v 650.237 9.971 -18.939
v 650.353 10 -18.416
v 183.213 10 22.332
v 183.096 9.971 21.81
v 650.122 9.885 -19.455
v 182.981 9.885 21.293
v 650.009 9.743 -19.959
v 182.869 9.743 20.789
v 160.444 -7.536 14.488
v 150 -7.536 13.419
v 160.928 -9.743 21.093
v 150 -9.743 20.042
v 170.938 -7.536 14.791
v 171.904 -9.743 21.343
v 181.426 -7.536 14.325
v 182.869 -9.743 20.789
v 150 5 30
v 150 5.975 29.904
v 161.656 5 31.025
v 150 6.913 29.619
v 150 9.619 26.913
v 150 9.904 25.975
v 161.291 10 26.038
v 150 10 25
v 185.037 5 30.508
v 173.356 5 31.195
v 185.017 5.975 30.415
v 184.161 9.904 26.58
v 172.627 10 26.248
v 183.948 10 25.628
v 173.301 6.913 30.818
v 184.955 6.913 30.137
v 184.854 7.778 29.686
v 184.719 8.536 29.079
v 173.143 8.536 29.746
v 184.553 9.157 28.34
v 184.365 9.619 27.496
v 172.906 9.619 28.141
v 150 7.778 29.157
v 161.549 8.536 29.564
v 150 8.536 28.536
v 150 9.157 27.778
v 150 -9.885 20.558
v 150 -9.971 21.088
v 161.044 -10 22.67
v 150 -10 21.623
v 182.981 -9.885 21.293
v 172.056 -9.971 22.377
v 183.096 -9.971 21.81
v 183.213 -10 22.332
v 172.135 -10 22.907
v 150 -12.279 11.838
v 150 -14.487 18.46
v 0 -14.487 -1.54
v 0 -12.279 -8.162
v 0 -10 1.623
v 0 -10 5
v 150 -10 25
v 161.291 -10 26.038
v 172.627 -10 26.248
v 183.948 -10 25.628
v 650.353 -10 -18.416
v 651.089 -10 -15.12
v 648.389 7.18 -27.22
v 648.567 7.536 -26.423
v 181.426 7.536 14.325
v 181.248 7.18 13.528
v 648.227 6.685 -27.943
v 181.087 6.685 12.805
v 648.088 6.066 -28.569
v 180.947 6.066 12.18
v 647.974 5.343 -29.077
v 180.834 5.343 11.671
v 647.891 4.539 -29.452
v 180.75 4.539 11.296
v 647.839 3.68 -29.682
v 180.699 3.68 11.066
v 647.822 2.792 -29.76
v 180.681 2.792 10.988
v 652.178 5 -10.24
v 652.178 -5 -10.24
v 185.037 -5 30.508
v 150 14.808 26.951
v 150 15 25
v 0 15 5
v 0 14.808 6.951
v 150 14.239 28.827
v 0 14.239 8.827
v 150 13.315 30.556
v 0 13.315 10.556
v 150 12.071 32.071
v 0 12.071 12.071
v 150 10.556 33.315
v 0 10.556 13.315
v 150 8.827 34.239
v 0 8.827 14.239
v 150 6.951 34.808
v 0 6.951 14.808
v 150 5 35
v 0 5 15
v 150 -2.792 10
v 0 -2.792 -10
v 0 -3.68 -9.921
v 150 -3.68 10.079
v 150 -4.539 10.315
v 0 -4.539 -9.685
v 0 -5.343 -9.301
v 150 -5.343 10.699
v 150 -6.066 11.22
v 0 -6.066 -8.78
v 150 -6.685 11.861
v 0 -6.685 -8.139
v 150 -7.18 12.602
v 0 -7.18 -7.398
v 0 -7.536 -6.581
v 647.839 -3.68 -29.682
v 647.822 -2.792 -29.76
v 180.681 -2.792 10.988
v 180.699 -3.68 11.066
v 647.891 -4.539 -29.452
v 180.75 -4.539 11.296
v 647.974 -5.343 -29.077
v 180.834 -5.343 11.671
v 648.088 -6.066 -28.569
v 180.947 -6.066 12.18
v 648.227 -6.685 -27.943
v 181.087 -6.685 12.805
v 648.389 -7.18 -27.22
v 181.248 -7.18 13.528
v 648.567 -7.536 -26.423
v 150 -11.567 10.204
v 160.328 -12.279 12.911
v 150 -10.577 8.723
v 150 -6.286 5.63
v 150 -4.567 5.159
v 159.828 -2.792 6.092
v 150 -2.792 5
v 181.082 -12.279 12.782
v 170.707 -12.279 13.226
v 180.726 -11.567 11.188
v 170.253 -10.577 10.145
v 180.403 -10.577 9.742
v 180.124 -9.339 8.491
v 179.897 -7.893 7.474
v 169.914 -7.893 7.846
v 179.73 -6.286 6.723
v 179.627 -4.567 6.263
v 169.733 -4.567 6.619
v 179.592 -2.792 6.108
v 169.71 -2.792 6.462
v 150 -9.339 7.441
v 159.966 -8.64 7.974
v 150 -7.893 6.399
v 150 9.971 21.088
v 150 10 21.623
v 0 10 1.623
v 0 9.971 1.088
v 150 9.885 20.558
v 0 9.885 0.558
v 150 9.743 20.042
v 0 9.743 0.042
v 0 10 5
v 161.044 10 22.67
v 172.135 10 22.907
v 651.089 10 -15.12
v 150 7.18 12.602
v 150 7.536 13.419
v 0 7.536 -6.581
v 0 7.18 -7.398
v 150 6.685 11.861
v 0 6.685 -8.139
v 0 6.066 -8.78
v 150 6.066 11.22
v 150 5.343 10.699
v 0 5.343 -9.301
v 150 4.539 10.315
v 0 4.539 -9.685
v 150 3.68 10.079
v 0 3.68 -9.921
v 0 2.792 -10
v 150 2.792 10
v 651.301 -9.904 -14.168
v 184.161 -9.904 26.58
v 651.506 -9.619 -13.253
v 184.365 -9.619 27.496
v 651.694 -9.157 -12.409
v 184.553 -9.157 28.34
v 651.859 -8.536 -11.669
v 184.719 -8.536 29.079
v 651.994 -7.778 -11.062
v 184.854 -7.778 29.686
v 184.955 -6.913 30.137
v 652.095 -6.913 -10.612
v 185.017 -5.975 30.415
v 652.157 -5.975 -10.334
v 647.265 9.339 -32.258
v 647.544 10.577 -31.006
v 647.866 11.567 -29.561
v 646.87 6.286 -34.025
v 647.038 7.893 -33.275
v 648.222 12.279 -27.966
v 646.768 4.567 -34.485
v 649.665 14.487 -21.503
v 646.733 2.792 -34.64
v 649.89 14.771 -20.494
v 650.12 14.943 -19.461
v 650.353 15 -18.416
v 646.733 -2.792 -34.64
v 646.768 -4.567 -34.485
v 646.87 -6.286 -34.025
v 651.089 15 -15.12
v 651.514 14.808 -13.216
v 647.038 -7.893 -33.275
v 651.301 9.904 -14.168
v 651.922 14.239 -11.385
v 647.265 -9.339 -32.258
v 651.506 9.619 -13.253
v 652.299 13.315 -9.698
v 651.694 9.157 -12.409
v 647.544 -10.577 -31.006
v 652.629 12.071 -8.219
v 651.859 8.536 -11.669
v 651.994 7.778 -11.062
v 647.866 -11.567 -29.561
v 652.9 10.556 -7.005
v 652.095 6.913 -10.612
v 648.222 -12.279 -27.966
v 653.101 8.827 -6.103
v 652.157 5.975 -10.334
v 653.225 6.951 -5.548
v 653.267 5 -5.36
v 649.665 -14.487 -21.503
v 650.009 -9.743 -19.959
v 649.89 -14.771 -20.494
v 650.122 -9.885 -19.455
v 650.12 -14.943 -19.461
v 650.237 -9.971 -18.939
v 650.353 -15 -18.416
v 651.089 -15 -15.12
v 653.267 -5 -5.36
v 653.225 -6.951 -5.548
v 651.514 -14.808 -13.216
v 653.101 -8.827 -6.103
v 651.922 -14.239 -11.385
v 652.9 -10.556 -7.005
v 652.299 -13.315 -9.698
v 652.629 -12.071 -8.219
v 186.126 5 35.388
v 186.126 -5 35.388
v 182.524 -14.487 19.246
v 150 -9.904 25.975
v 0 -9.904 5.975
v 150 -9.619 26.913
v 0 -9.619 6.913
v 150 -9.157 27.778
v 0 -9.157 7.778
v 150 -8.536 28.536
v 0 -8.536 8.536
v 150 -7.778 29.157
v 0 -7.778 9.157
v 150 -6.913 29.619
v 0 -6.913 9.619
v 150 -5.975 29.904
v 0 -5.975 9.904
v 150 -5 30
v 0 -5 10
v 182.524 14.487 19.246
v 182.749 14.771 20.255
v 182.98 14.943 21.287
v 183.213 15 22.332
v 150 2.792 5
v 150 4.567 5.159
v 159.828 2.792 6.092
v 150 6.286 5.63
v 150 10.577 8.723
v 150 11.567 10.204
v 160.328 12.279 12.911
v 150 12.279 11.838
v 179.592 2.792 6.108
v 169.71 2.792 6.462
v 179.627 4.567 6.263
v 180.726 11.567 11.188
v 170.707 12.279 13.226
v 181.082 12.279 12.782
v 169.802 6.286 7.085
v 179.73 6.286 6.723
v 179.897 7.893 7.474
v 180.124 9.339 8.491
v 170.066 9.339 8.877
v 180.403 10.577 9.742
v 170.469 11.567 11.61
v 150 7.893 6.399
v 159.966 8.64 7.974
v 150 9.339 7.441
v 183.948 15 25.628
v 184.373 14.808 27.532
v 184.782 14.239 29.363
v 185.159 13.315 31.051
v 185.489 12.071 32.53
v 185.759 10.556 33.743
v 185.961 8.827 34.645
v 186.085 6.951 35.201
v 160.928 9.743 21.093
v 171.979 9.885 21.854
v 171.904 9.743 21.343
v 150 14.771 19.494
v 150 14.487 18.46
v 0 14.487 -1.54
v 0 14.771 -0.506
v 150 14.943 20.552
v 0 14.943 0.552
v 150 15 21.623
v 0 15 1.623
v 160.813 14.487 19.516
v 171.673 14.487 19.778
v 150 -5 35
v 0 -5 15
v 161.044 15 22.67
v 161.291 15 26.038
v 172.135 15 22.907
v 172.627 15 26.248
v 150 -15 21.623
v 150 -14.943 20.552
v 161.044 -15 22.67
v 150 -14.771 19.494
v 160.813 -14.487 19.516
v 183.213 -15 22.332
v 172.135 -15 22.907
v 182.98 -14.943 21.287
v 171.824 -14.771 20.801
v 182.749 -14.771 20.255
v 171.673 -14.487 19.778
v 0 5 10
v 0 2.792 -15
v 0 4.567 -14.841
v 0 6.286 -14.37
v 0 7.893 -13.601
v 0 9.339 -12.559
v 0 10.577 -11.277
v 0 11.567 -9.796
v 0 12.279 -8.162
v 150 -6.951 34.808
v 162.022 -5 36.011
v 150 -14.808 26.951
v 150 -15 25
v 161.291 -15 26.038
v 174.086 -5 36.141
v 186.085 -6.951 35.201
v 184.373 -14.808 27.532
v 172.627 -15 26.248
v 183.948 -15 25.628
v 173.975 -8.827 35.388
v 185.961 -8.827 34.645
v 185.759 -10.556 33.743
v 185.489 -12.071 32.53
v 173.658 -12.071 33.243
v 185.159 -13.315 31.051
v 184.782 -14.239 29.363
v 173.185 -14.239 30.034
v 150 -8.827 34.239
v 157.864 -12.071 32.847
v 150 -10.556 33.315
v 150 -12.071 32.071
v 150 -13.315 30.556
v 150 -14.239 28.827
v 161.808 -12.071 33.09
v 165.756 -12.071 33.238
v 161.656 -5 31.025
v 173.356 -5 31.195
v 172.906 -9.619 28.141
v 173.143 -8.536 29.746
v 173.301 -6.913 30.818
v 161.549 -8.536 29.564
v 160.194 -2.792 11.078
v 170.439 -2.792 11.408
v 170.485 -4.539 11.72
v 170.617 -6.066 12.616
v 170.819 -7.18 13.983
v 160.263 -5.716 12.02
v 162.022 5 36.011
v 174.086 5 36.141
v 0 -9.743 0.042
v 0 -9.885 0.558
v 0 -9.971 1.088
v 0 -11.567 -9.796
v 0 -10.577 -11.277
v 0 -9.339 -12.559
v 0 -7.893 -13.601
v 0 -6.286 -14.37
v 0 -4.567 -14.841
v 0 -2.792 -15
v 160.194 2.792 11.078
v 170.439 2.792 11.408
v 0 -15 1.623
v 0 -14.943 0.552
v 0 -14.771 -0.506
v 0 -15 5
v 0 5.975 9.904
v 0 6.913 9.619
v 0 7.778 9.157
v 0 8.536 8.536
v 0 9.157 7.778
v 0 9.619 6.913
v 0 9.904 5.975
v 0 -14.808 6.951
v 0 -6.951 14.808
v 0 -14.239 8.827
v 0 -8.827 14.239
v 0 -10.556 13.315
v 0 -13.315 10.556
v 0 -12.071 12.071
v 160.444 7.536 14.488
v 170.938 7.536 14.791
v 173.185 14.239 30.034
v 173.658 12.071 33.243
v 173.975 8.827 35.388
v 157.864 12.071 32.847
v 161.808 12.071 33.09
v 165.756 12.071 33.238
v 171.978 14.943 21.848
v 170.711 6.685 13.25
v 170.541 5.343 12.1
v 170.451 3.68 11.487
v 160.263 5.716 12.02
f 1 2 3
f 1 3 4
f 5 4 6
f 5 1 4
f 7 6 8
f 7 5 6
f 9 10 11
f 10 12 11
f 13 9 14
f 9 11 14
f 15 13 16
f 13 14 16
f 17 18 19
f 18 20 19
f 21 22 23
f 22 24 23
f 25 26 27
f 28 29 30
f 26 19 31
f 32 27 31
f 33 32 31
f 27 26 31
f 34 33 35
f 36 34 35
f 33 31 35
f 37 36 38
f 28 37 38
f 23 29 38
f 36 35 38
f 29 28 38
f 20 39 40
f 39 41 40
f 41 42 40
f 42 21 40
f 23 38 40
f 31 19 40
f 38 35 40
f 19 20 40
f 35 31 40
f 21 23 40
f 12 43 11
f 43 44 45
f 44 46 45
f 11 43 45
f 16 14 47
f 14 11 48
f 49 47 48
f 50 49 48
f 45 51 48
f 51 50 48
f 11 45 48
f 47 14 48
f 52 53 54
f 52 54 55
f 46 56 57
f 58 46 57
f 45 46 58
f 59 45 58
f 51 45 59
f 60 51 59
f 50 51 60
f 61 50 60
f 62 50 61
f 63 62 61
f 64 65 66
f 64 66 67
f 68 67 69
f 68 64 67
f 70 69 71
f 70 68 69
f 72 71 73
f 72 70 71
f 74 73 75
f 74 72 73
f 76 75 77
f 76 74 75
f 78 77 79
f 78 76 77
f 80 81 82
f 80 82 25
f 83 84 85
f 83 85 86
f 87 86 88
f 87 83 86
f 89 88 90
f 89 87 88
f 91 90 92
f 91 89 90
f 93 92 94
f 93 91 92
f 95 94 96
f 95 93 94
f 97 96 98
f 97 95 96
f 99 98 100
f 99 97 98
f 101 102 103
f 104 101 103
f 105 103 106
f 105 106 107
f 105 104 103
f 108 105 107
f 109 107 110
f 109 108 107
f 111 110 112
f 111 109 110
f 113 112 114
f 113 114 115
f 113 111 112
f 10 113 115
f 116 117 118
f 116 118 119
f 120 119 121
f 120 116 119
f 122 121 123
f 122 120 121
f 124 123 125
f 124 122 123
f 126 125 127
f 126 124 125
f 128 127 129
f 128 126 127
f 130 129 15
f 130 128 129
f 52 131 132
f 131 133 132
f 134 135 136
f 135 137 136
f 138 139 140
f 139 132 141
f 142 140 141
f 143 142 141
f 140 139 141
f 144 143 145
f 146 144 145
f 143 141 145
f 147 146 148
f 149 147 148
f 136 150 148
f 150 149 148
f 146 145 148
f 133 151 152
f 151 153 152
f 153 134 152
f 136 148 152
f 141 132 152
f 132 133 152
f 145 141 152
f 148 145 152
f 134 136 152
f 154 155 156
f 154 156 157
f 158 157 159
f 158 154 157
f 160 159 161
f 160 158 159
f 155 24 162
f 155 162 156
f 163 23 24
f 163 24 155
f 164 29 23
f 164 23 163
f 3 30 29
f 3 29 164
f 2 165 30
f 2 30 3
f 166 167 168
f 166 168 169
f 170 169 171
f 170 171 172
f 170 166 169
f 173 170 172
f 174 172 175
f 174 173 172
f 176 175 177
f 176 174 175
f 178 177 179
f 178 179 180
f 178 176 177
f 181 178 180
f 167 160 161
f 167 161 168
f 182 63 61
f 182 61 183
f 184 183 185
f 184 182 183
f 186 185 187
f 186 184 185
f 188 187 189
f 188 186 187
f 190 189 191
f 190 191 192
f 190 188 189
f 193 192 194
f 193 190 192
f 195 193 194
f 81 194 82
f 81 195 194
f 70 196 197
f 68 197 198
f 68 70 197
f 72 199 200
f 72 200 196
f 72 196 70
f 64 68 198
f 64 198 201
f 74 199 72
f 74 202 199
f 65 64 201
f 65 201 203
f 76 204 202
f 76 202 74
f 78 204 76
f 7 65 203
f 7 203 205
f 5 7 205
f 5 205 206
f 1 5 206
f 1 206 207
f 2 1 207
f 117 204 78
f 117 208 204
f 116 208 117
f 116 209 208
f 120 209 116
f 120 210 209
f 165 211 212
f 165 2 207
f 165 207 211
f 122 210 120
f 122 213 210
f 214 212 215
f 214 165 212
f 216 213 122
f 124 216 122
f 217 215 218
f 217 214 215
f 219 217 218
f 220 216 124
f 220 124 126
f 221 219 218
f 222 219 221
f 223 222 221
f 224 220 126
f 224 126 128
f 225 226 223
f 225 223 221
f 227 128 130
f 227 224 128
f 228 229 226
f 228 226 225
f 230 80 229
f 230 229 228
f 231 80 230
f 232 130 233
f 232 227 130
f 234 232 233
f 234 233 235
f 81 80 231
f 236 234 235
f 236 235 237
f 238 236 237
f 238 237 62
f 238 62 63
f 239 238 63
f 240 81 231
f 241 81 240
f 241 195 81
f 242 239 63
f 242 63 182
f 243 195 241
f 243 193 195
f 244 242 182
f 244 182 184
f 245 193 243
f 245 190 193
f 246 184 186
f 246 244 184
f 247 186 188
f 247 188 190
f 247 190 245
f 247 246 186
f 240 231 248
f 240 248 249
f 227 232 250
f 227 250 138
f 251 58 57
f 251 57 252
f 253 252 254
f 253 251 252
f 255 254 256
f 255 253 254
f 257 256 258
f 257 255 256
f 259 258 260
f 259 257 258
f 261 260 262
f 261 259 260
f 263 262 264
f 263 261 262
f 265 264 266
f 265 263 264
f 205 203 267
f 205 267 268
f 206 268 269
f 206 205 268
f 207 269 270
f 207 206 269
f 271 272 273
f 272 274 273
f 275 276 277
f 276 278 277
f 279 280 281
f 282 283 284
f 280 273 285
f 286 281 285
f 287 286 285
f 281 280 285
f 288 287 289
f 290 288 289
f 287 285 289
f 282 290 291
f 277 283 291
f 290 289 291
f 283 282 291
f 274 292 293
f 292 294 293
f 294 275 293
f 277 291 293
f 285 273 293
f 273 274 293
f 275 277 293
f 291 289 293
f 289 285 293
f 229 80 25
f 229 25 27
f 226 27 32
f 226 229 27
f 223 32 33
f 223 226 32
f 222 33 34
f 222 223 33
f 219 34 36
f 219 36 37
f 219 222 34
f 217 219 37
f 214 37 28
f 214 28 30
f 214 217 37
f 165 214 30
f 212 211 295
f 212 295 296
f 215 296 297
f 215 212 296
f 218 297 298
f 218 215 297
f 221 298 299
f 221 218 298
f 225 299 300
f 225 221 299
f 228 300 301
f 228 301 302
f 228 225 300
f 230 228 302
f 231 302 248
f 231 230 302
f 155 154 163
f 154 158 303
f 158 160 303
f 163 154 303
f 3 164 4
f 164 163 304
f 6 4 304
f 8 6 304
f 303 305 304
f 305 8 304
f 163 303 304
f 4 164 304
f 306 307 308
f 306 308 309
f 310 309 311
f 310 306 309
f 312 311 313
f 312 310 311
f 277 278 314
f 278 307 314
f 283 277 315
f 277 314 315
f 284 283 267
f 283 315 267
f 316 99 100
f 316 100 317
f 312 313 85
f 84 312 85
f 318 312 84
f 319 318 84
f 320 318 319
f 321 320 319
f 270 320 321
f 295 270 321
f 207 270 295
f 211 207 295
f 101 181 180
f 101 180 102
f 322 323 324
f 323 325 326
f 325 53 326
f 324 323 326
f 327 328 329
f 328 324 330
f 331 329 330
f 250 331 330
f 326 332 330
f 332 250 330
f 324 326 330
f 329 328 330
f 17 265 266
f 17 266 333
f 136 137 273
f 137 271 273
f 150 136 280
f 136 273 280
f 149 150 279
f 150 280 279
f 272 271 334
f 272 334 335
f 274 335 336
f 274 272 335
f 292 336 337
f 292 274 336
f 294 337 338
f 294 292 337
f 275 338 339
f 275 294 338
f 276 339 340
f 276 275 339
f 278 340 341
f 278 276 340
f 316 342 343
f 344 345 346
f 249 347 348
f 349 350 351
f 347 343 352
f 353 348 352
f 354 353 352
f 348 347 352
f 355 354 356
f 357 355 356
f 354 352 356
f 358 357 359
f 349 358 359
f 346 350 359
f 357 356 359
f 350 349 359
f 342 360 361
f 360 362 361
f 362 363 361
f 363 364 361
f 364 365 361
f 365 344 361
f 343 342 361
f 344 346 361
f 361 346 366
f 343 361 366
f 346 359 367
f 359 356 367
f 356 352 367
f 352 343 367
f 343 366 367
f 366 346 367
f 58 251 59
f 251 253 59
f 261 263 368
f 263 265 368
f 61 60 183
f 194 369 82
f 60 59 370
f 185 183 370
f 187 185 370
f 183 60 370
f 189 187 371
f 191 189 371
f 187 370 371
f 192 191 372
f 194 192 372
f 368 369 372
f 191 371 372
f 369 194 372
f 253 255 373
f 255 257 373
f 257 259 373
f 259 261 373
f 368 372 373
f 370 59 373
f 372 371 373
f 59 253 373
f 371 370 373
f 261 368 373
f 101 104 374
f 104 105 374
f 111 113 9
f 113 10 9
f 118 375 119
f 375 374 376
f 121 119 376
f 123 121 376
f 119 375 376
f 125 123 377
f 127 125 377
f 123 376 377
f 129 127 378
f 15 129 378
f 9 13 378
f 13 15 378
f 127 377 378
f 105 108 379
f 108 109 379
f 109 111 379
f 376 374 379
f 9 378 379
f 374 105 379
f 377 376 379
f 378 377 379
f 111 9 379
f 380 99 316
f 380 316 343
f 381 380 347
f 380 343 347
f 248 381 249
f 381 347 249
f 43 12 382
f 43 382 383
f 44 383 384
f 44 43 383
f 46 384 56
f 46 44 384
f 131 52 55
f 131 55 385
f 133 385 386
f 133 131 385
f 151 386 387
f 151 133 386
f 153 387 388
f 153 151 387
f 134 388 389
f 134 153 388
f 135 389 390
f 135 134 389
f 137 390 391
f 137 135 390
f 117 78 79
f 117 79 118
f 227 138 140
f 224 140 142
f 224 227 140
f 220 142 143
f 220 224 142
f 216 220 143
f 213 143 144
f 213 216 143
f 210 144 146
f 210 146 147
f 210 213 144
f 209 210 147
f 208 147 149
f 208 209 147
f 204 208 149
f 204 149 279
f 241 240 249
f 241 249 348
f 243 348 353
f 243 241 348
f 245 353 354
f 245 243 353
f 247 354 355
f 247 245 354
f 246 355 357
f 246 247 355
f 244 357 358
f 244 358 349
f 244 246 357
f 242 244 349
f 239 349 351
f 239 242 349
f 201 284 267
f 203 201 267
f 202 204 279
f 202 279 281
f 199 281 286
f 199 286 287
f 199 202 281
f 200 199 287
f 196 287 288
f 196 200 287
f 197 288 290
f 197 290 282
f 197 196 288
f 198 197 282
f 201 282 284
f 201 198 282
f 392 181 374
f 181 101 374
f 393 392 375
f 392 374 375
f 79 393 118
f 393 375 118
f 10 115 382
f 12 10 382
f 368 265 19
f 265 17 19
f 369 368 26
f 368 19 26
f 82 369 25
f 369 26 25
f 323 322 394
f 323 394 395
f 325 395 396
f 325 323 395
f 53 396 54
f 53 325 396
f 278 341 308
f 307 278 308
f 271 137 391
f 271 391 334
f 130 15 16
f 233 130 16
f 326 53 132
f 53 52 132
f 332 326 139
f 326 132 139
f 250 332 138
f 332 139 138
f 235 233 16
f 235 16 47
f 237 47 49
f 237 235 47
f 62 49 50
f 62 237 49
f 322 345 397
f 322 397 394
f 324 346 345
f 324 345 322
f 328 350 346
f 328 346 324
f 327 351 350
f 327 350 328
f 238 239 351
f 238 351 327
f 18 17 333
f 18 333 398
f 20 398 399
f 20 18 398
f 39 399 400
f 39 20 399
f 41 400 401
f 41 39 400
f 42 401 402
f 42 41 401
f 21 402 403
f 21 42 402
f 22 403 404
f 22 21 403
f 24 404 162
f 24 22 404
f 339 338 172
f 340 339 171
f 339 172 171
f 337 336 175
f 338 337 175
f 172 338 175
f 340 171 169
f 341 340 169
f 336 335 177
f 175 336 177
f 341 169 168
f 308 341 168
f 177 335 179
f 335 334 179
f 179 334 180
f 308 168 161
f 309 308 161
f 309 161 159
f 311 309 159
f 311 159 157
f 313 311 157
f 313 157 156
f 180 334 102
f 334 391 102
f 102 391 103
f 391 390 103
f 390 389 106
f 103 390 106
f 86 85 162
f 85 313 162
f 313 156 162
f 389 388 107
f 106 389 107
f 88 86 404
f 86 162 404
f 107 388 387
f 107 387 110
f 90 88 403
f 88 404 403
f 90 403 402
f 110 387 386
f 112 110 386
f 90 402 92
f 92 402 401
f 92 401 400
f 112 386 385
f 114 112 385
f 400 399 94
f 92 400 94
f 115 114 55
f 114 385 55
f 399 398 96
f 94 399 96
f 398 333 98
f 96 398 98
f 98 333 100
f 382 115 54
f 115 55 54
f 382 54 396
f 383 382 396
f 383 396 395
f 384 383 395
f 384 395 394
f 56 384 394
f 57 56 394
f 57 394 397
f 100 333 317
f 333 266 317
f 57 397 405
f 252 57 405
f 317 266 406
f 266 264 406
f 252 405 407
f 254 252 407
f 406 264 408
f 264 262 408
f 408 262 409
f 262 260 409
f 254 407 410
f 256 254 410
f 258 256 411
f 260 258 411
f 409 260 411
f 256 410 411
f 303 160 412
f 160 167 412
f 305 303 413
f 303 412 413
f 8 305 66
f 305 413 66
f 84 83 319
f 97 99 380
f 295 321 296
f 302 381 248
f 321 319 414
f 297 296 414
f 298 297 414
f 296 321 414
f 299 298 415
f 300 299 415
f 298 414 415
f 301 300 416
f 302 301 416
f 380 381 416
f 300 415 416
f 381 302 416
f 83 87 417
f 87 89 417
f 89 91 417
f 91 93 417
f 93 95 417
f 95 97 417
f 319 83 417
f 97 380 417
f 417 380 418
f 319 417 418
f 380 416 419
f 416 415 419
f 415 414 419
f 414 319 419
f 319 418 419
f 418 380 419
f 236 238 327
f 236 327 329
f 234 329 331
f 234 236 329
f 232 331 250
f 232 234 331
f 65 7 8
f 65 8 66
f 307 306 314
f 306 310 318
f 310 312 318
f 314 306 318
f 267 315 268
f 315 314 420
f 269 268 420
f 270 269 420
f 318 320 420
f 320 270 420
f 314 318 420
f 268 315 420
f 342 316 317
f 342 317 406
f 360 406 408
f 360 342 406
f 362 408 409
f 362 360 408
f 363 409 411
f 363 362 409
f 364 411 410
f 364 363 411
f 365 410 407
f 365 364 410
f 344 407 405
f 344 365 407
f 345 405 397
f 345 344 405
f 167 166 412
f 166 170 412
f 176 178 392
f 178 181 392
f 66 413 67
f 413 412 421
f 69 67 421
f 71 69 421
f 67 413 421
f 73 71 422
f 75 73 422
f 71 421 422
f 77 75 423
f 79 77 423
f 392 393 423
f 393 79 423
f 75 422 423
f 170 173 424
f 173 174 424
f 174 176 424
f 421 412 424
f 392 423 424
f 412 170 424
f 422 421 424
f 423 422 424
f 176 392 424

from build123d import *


with BuildPart() as f2:
    # F2: sweep along a path in F0
    with BuildLine(Plane.XZ) as f2_path:
        Line((0, 0), (150, 20))
        ThreePointArc((150, 20), (166.4091739376, 21.2769270288), (182.8594678141, 20.7483787065))
        Line((182.8594678141, 20.7483787065), (650, -20))
    # F1 (on Right) → F2 (sweep)
    with BuildSketch(Plane.YZ):
        with BuildLine():
            ThreePointArc((15, 5), (12.0710678119, 12.0710678119), (5, 15))
            Line((5, 15), (-5, 15))
            ThreePointArc((-5, 15), (-12.0710678119, 12.0710678119), (-15, 5))
            Line((-15, 5), (-15, 1.6227766017))
            ThreePointArc((-15, 1.6227766017), (-14.8708745764, 0.0209541716), (-14.4868329805, -1.5395010585))
            Line((-14.4868329805, -1.5395010585), (-12.2792407799, -8.1622776602))
            ThreePointArc((-12.2792407799, -8.1622776602), (-8.6395106461, -13.1124218518), (-2.7924077994, -15))
            Line((-2.7924077994, -15), (2.7924077994, -15))
            ThreePointArc((2.7924077994, -15), (8.6395106461, -13.1124218518), (12.2792407799, -8.1622776602))
            Line((12.2792407799, -8.1622776602), (14.4868329805, -1.5395010585))
            ThreePointArc((14.4868329805, -1.5395010585), (14.8708745764, 0.0209541716), (15, 1.6227766017))
            Line((15, 1.6227766017), (15, 5))
        make_face()
        with BuildLine():
            ThreePointArc((5, 10), (8.5355339059, 8.5355339059), (10, 5))
            Line((10, 5), (10, 1.6227766017))
            ThreePointArc((10, 1.6227766017), (9.9354372882, 0.8218653866), (9.7434164903, 0.0416377716))
            Line((9.7434164903, 0.0416377716), (7.5358242897, -6.5811388301))
            ThreePointArc((7.5358242897, -6.5811388301), (5.7159592228, -9.0562109259), (2.7924077994, -10))
            Line((2.7924077994, -10), (-2.7924077994, -10))
            ThreePointArc((-2.7924077994, -10), (-5.7159592228, -9.0562109259), (-7.5358242897, -6.5811388301))
            Line((-7.5358242897, -6.5811388301), (-9.7434164903, 0.0416377716))
            ThreePointArc((-9.7434164903, 0.0416377716), (-9.9354372882, 0.8218653866), (-10, 1.6227766017))
            Line((-10, 1.6227766017), (-10, 5))
            ThreePointArc((-10, 5), (-8.5355339059, 8.5355339059), (-5, 10))
            Line((-5, 10), (5, 10))
        make_face(mode=Mode.SUBTRACT)
    sweep(path=f2_path.line)


solid = f2.part
